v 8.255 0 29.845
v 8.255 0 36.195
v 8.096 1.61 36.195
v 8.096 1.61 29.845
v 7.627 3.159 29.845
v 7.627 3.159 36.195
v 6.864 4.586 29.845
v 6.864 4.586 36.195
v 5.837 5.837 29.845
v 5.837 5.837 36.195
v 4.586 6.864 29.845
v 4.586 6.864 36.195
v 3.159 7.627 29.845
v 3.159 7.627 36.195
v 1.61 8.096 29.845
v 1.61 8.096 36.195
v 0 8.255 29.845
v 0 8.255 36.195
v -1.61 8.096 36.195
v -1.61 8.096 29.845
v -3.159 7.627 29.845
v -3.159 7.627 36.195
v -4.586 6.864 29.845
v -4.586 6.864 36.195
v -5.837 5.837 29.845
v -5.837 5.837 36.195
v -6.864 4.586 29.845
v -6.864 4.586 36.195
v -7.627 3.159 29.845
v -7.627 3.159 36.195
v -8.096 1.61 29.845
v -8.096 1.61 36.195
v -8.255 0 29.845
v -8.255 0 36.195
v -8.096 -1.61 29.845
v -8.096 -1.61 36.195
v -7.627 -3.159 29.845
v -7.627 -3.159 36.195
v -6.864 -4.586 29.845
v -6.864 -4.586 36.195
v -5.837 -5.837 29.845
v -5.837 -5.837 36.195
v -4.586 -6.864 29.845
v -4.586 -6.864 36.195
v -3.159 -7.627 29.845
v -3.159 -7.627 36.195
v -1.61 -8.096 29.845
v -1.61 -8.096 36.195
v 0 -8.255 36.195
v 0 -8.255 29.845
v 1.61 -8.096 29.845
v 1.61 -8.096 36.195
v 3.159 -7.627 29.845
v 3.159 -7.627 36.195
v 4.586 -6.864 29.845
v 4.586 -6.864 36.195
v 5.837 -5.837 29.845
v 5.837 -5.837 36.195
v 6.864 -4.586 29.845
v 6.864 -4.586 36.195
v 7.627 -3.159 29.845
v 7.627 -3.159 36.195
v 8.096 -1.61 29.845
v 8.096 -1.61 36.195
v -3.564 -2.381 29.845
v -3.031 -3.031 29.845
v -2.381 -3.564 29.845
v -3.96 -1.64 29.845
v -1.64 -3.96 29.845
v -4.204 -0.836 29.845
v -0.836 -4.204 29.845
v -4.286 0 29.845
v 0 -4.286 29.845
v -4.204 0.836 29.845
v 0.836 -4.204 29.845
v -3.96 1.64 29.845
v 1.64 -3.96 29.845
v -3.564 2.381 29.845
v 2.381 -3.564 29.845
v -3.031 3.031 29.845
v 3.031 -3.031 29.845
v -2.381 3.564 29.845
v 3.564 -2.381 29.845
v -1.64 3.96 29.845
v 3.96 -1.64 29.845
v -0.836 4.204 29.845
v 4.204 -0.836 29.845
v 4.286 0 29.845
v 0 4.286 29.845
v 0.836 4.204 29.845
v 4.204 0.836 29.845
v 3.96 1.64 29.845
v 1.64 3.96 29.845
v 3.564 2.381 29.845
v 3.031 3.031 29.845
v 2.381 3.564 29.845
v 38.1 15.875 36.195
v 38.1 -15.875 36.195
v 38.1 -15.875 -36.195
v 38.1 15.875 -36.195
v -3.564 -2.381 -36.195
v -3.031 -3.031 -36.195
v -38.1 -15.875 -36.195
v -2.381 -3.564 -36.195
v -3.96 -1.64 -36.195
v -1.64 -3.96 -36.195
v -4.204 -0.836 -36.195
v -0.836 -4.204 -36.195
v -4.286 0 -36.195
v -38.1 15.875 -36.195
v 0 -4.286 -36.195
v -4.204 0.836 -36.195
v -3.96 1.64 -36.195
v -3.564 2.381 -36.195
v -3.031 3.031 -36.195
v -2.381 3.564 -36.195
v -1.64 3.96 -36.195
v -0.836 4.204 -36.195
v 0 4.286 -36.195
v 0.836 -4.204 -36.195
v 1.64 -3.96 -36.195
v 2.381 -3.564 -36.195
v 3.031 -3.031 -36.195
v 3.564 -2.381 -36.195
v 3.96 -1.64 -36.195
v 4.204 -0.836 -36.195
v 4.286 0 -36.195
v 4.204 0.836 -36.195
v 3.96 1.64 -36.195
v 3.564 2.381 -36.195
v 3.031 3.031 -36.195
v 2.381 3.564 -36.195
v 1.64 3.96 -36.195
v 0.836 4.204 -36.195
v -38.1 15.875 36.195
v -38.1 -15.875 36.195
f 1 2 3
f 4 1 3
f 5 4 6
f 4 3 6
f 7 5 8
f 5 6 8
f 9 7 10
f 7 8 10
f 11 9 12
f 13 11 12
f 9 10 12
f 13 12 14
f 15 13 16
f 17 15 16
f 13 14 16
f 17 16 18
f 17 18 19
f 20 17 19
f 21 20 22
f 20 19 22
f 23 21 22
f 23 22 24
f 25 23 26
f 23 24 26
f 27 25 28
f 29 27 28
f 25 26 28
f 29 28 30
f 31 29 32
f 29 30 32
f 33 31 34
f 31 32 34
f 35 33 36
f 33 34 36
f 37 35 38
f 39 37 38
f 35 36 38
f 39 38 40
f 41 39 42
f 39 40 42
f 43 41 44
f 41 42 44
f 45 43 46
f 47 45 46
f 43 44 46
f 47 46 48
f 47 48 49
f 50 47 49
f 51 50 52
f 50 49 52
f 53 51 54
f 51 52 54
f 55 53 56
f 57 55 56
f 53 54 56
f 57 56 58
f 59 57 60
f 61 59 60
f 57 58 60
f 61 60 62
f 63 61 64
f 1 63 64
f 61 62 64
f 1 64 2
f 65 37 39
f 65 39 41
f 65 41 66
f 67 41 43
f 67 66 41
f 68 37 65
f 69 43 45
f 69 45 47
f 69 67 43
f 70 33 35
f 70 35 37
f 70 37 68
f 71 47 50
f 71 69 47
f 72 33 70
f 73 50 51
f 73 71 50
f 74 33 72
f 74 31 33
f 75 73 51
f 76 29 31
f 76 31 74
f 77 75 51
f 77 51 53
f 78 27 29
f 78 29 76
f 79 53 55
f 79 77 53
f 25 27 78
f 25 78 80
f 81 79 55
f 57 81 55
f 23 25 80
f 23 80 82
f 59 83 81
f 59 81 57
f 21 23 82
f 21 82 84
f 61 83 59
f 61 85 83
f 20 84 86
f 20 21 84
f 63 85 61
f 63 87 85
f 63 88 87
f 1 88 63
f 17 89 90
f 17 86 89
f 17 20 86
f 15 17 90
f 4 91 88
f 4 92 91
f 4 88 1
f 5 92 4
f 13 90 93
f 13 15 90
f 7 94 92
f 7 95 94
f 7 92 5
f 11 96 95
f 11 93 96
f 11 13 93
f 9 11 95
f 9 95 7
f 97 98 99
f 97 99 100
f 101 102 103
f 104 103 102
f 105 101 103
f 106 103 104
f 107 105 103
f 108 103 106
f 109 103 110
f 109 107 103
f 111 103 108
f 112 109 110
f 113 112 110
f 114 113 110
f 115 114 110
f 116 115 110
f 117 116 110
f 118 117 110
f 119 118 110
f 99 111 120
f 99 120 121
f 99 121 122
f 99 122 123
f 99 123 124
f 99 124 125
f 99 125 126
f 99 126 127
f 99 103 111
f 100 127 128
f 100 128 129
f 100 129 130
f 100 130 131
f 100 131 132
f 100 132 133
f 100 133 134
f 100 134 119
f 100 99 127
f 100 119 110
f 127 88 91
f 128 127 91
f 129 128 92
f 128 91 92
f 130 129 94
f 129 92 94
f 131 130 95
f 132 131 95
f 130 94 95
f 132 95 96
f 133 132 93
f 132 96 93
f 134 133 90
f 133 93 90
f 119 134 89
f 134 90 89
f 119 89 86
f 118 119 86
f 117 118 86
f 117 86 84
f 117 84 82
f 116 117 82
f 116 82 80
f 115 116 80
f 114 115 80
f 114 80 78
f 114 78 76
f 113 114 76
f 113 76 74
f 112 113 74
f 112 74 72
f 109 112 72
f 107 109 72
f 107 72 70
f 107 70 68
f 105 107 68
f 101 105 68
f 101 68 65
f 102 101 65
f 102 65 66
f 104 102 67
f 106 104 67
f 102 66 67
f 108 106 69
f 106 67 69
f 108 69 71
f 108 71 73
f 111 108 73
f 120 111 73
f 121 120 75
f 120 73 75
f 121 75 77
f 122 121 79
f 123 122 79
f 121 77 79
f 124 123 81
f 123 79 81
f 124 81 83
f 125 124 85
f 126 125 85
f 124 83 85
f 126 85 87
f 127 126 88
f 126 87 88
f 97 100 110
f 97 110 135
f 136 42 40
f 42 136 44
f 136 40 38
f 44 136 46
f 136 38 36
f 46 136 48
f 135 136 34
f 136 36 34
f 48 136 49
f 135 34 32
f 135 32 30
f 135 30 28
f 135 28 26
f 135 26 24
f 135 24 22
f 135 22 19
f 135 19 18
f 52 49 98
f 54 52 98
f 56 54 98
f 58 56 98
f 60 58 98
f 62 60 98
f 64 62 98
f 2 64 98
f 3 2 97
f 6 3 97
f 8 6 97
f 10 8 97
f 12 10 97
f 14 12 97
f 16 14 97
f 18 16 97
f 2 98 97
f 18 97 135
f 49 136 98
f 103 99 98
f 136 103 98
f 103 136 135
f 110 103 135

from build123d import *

# Parameters (mm, degrees)
F0_W          = 31.75
F0_H          = 72.39
F1_DEPTH      = 38.1
F1_DEPTH_BACK = 38.1
F2_R          = 8.255
F2_R_2        = 4.28625
F3_DEPTH      = 6.35
F3_FACE_R     = 4.28625
F4_DEPTH      = 72.391


with BuildPart() as f1:
    # F0 (on Right) → F1 (new body, two sides)
    with BuildSketch(Plane.YZ) as f1_sk:
        Rectangle(F0_W, F0_H)
    extrude(amount=F1_DEPTH)
    extrude(f1_sk.sketch, amount=-F1_DEPTH_BACK)

    # F2 (on face) → F3 (cut)
    with BuildSketch(Plane.XY.offset(36.195)):
        Circle(F2_R)
        Circle(F2_R_2, mode=Mode.SUBTRACT)
    extrude(amount=-F3_DEPTH, mode=Mode.SUBTRACT)

    # F3_face (on face) → F4 (cut, through all)
    with BuildSketch(Plane.XY.offset(36.195)):
        Circle(F3_FACE_R)
    extrude(amount=-F4_DEPTH, mode=Mode.SUBTRACT)


solid = f1.part
